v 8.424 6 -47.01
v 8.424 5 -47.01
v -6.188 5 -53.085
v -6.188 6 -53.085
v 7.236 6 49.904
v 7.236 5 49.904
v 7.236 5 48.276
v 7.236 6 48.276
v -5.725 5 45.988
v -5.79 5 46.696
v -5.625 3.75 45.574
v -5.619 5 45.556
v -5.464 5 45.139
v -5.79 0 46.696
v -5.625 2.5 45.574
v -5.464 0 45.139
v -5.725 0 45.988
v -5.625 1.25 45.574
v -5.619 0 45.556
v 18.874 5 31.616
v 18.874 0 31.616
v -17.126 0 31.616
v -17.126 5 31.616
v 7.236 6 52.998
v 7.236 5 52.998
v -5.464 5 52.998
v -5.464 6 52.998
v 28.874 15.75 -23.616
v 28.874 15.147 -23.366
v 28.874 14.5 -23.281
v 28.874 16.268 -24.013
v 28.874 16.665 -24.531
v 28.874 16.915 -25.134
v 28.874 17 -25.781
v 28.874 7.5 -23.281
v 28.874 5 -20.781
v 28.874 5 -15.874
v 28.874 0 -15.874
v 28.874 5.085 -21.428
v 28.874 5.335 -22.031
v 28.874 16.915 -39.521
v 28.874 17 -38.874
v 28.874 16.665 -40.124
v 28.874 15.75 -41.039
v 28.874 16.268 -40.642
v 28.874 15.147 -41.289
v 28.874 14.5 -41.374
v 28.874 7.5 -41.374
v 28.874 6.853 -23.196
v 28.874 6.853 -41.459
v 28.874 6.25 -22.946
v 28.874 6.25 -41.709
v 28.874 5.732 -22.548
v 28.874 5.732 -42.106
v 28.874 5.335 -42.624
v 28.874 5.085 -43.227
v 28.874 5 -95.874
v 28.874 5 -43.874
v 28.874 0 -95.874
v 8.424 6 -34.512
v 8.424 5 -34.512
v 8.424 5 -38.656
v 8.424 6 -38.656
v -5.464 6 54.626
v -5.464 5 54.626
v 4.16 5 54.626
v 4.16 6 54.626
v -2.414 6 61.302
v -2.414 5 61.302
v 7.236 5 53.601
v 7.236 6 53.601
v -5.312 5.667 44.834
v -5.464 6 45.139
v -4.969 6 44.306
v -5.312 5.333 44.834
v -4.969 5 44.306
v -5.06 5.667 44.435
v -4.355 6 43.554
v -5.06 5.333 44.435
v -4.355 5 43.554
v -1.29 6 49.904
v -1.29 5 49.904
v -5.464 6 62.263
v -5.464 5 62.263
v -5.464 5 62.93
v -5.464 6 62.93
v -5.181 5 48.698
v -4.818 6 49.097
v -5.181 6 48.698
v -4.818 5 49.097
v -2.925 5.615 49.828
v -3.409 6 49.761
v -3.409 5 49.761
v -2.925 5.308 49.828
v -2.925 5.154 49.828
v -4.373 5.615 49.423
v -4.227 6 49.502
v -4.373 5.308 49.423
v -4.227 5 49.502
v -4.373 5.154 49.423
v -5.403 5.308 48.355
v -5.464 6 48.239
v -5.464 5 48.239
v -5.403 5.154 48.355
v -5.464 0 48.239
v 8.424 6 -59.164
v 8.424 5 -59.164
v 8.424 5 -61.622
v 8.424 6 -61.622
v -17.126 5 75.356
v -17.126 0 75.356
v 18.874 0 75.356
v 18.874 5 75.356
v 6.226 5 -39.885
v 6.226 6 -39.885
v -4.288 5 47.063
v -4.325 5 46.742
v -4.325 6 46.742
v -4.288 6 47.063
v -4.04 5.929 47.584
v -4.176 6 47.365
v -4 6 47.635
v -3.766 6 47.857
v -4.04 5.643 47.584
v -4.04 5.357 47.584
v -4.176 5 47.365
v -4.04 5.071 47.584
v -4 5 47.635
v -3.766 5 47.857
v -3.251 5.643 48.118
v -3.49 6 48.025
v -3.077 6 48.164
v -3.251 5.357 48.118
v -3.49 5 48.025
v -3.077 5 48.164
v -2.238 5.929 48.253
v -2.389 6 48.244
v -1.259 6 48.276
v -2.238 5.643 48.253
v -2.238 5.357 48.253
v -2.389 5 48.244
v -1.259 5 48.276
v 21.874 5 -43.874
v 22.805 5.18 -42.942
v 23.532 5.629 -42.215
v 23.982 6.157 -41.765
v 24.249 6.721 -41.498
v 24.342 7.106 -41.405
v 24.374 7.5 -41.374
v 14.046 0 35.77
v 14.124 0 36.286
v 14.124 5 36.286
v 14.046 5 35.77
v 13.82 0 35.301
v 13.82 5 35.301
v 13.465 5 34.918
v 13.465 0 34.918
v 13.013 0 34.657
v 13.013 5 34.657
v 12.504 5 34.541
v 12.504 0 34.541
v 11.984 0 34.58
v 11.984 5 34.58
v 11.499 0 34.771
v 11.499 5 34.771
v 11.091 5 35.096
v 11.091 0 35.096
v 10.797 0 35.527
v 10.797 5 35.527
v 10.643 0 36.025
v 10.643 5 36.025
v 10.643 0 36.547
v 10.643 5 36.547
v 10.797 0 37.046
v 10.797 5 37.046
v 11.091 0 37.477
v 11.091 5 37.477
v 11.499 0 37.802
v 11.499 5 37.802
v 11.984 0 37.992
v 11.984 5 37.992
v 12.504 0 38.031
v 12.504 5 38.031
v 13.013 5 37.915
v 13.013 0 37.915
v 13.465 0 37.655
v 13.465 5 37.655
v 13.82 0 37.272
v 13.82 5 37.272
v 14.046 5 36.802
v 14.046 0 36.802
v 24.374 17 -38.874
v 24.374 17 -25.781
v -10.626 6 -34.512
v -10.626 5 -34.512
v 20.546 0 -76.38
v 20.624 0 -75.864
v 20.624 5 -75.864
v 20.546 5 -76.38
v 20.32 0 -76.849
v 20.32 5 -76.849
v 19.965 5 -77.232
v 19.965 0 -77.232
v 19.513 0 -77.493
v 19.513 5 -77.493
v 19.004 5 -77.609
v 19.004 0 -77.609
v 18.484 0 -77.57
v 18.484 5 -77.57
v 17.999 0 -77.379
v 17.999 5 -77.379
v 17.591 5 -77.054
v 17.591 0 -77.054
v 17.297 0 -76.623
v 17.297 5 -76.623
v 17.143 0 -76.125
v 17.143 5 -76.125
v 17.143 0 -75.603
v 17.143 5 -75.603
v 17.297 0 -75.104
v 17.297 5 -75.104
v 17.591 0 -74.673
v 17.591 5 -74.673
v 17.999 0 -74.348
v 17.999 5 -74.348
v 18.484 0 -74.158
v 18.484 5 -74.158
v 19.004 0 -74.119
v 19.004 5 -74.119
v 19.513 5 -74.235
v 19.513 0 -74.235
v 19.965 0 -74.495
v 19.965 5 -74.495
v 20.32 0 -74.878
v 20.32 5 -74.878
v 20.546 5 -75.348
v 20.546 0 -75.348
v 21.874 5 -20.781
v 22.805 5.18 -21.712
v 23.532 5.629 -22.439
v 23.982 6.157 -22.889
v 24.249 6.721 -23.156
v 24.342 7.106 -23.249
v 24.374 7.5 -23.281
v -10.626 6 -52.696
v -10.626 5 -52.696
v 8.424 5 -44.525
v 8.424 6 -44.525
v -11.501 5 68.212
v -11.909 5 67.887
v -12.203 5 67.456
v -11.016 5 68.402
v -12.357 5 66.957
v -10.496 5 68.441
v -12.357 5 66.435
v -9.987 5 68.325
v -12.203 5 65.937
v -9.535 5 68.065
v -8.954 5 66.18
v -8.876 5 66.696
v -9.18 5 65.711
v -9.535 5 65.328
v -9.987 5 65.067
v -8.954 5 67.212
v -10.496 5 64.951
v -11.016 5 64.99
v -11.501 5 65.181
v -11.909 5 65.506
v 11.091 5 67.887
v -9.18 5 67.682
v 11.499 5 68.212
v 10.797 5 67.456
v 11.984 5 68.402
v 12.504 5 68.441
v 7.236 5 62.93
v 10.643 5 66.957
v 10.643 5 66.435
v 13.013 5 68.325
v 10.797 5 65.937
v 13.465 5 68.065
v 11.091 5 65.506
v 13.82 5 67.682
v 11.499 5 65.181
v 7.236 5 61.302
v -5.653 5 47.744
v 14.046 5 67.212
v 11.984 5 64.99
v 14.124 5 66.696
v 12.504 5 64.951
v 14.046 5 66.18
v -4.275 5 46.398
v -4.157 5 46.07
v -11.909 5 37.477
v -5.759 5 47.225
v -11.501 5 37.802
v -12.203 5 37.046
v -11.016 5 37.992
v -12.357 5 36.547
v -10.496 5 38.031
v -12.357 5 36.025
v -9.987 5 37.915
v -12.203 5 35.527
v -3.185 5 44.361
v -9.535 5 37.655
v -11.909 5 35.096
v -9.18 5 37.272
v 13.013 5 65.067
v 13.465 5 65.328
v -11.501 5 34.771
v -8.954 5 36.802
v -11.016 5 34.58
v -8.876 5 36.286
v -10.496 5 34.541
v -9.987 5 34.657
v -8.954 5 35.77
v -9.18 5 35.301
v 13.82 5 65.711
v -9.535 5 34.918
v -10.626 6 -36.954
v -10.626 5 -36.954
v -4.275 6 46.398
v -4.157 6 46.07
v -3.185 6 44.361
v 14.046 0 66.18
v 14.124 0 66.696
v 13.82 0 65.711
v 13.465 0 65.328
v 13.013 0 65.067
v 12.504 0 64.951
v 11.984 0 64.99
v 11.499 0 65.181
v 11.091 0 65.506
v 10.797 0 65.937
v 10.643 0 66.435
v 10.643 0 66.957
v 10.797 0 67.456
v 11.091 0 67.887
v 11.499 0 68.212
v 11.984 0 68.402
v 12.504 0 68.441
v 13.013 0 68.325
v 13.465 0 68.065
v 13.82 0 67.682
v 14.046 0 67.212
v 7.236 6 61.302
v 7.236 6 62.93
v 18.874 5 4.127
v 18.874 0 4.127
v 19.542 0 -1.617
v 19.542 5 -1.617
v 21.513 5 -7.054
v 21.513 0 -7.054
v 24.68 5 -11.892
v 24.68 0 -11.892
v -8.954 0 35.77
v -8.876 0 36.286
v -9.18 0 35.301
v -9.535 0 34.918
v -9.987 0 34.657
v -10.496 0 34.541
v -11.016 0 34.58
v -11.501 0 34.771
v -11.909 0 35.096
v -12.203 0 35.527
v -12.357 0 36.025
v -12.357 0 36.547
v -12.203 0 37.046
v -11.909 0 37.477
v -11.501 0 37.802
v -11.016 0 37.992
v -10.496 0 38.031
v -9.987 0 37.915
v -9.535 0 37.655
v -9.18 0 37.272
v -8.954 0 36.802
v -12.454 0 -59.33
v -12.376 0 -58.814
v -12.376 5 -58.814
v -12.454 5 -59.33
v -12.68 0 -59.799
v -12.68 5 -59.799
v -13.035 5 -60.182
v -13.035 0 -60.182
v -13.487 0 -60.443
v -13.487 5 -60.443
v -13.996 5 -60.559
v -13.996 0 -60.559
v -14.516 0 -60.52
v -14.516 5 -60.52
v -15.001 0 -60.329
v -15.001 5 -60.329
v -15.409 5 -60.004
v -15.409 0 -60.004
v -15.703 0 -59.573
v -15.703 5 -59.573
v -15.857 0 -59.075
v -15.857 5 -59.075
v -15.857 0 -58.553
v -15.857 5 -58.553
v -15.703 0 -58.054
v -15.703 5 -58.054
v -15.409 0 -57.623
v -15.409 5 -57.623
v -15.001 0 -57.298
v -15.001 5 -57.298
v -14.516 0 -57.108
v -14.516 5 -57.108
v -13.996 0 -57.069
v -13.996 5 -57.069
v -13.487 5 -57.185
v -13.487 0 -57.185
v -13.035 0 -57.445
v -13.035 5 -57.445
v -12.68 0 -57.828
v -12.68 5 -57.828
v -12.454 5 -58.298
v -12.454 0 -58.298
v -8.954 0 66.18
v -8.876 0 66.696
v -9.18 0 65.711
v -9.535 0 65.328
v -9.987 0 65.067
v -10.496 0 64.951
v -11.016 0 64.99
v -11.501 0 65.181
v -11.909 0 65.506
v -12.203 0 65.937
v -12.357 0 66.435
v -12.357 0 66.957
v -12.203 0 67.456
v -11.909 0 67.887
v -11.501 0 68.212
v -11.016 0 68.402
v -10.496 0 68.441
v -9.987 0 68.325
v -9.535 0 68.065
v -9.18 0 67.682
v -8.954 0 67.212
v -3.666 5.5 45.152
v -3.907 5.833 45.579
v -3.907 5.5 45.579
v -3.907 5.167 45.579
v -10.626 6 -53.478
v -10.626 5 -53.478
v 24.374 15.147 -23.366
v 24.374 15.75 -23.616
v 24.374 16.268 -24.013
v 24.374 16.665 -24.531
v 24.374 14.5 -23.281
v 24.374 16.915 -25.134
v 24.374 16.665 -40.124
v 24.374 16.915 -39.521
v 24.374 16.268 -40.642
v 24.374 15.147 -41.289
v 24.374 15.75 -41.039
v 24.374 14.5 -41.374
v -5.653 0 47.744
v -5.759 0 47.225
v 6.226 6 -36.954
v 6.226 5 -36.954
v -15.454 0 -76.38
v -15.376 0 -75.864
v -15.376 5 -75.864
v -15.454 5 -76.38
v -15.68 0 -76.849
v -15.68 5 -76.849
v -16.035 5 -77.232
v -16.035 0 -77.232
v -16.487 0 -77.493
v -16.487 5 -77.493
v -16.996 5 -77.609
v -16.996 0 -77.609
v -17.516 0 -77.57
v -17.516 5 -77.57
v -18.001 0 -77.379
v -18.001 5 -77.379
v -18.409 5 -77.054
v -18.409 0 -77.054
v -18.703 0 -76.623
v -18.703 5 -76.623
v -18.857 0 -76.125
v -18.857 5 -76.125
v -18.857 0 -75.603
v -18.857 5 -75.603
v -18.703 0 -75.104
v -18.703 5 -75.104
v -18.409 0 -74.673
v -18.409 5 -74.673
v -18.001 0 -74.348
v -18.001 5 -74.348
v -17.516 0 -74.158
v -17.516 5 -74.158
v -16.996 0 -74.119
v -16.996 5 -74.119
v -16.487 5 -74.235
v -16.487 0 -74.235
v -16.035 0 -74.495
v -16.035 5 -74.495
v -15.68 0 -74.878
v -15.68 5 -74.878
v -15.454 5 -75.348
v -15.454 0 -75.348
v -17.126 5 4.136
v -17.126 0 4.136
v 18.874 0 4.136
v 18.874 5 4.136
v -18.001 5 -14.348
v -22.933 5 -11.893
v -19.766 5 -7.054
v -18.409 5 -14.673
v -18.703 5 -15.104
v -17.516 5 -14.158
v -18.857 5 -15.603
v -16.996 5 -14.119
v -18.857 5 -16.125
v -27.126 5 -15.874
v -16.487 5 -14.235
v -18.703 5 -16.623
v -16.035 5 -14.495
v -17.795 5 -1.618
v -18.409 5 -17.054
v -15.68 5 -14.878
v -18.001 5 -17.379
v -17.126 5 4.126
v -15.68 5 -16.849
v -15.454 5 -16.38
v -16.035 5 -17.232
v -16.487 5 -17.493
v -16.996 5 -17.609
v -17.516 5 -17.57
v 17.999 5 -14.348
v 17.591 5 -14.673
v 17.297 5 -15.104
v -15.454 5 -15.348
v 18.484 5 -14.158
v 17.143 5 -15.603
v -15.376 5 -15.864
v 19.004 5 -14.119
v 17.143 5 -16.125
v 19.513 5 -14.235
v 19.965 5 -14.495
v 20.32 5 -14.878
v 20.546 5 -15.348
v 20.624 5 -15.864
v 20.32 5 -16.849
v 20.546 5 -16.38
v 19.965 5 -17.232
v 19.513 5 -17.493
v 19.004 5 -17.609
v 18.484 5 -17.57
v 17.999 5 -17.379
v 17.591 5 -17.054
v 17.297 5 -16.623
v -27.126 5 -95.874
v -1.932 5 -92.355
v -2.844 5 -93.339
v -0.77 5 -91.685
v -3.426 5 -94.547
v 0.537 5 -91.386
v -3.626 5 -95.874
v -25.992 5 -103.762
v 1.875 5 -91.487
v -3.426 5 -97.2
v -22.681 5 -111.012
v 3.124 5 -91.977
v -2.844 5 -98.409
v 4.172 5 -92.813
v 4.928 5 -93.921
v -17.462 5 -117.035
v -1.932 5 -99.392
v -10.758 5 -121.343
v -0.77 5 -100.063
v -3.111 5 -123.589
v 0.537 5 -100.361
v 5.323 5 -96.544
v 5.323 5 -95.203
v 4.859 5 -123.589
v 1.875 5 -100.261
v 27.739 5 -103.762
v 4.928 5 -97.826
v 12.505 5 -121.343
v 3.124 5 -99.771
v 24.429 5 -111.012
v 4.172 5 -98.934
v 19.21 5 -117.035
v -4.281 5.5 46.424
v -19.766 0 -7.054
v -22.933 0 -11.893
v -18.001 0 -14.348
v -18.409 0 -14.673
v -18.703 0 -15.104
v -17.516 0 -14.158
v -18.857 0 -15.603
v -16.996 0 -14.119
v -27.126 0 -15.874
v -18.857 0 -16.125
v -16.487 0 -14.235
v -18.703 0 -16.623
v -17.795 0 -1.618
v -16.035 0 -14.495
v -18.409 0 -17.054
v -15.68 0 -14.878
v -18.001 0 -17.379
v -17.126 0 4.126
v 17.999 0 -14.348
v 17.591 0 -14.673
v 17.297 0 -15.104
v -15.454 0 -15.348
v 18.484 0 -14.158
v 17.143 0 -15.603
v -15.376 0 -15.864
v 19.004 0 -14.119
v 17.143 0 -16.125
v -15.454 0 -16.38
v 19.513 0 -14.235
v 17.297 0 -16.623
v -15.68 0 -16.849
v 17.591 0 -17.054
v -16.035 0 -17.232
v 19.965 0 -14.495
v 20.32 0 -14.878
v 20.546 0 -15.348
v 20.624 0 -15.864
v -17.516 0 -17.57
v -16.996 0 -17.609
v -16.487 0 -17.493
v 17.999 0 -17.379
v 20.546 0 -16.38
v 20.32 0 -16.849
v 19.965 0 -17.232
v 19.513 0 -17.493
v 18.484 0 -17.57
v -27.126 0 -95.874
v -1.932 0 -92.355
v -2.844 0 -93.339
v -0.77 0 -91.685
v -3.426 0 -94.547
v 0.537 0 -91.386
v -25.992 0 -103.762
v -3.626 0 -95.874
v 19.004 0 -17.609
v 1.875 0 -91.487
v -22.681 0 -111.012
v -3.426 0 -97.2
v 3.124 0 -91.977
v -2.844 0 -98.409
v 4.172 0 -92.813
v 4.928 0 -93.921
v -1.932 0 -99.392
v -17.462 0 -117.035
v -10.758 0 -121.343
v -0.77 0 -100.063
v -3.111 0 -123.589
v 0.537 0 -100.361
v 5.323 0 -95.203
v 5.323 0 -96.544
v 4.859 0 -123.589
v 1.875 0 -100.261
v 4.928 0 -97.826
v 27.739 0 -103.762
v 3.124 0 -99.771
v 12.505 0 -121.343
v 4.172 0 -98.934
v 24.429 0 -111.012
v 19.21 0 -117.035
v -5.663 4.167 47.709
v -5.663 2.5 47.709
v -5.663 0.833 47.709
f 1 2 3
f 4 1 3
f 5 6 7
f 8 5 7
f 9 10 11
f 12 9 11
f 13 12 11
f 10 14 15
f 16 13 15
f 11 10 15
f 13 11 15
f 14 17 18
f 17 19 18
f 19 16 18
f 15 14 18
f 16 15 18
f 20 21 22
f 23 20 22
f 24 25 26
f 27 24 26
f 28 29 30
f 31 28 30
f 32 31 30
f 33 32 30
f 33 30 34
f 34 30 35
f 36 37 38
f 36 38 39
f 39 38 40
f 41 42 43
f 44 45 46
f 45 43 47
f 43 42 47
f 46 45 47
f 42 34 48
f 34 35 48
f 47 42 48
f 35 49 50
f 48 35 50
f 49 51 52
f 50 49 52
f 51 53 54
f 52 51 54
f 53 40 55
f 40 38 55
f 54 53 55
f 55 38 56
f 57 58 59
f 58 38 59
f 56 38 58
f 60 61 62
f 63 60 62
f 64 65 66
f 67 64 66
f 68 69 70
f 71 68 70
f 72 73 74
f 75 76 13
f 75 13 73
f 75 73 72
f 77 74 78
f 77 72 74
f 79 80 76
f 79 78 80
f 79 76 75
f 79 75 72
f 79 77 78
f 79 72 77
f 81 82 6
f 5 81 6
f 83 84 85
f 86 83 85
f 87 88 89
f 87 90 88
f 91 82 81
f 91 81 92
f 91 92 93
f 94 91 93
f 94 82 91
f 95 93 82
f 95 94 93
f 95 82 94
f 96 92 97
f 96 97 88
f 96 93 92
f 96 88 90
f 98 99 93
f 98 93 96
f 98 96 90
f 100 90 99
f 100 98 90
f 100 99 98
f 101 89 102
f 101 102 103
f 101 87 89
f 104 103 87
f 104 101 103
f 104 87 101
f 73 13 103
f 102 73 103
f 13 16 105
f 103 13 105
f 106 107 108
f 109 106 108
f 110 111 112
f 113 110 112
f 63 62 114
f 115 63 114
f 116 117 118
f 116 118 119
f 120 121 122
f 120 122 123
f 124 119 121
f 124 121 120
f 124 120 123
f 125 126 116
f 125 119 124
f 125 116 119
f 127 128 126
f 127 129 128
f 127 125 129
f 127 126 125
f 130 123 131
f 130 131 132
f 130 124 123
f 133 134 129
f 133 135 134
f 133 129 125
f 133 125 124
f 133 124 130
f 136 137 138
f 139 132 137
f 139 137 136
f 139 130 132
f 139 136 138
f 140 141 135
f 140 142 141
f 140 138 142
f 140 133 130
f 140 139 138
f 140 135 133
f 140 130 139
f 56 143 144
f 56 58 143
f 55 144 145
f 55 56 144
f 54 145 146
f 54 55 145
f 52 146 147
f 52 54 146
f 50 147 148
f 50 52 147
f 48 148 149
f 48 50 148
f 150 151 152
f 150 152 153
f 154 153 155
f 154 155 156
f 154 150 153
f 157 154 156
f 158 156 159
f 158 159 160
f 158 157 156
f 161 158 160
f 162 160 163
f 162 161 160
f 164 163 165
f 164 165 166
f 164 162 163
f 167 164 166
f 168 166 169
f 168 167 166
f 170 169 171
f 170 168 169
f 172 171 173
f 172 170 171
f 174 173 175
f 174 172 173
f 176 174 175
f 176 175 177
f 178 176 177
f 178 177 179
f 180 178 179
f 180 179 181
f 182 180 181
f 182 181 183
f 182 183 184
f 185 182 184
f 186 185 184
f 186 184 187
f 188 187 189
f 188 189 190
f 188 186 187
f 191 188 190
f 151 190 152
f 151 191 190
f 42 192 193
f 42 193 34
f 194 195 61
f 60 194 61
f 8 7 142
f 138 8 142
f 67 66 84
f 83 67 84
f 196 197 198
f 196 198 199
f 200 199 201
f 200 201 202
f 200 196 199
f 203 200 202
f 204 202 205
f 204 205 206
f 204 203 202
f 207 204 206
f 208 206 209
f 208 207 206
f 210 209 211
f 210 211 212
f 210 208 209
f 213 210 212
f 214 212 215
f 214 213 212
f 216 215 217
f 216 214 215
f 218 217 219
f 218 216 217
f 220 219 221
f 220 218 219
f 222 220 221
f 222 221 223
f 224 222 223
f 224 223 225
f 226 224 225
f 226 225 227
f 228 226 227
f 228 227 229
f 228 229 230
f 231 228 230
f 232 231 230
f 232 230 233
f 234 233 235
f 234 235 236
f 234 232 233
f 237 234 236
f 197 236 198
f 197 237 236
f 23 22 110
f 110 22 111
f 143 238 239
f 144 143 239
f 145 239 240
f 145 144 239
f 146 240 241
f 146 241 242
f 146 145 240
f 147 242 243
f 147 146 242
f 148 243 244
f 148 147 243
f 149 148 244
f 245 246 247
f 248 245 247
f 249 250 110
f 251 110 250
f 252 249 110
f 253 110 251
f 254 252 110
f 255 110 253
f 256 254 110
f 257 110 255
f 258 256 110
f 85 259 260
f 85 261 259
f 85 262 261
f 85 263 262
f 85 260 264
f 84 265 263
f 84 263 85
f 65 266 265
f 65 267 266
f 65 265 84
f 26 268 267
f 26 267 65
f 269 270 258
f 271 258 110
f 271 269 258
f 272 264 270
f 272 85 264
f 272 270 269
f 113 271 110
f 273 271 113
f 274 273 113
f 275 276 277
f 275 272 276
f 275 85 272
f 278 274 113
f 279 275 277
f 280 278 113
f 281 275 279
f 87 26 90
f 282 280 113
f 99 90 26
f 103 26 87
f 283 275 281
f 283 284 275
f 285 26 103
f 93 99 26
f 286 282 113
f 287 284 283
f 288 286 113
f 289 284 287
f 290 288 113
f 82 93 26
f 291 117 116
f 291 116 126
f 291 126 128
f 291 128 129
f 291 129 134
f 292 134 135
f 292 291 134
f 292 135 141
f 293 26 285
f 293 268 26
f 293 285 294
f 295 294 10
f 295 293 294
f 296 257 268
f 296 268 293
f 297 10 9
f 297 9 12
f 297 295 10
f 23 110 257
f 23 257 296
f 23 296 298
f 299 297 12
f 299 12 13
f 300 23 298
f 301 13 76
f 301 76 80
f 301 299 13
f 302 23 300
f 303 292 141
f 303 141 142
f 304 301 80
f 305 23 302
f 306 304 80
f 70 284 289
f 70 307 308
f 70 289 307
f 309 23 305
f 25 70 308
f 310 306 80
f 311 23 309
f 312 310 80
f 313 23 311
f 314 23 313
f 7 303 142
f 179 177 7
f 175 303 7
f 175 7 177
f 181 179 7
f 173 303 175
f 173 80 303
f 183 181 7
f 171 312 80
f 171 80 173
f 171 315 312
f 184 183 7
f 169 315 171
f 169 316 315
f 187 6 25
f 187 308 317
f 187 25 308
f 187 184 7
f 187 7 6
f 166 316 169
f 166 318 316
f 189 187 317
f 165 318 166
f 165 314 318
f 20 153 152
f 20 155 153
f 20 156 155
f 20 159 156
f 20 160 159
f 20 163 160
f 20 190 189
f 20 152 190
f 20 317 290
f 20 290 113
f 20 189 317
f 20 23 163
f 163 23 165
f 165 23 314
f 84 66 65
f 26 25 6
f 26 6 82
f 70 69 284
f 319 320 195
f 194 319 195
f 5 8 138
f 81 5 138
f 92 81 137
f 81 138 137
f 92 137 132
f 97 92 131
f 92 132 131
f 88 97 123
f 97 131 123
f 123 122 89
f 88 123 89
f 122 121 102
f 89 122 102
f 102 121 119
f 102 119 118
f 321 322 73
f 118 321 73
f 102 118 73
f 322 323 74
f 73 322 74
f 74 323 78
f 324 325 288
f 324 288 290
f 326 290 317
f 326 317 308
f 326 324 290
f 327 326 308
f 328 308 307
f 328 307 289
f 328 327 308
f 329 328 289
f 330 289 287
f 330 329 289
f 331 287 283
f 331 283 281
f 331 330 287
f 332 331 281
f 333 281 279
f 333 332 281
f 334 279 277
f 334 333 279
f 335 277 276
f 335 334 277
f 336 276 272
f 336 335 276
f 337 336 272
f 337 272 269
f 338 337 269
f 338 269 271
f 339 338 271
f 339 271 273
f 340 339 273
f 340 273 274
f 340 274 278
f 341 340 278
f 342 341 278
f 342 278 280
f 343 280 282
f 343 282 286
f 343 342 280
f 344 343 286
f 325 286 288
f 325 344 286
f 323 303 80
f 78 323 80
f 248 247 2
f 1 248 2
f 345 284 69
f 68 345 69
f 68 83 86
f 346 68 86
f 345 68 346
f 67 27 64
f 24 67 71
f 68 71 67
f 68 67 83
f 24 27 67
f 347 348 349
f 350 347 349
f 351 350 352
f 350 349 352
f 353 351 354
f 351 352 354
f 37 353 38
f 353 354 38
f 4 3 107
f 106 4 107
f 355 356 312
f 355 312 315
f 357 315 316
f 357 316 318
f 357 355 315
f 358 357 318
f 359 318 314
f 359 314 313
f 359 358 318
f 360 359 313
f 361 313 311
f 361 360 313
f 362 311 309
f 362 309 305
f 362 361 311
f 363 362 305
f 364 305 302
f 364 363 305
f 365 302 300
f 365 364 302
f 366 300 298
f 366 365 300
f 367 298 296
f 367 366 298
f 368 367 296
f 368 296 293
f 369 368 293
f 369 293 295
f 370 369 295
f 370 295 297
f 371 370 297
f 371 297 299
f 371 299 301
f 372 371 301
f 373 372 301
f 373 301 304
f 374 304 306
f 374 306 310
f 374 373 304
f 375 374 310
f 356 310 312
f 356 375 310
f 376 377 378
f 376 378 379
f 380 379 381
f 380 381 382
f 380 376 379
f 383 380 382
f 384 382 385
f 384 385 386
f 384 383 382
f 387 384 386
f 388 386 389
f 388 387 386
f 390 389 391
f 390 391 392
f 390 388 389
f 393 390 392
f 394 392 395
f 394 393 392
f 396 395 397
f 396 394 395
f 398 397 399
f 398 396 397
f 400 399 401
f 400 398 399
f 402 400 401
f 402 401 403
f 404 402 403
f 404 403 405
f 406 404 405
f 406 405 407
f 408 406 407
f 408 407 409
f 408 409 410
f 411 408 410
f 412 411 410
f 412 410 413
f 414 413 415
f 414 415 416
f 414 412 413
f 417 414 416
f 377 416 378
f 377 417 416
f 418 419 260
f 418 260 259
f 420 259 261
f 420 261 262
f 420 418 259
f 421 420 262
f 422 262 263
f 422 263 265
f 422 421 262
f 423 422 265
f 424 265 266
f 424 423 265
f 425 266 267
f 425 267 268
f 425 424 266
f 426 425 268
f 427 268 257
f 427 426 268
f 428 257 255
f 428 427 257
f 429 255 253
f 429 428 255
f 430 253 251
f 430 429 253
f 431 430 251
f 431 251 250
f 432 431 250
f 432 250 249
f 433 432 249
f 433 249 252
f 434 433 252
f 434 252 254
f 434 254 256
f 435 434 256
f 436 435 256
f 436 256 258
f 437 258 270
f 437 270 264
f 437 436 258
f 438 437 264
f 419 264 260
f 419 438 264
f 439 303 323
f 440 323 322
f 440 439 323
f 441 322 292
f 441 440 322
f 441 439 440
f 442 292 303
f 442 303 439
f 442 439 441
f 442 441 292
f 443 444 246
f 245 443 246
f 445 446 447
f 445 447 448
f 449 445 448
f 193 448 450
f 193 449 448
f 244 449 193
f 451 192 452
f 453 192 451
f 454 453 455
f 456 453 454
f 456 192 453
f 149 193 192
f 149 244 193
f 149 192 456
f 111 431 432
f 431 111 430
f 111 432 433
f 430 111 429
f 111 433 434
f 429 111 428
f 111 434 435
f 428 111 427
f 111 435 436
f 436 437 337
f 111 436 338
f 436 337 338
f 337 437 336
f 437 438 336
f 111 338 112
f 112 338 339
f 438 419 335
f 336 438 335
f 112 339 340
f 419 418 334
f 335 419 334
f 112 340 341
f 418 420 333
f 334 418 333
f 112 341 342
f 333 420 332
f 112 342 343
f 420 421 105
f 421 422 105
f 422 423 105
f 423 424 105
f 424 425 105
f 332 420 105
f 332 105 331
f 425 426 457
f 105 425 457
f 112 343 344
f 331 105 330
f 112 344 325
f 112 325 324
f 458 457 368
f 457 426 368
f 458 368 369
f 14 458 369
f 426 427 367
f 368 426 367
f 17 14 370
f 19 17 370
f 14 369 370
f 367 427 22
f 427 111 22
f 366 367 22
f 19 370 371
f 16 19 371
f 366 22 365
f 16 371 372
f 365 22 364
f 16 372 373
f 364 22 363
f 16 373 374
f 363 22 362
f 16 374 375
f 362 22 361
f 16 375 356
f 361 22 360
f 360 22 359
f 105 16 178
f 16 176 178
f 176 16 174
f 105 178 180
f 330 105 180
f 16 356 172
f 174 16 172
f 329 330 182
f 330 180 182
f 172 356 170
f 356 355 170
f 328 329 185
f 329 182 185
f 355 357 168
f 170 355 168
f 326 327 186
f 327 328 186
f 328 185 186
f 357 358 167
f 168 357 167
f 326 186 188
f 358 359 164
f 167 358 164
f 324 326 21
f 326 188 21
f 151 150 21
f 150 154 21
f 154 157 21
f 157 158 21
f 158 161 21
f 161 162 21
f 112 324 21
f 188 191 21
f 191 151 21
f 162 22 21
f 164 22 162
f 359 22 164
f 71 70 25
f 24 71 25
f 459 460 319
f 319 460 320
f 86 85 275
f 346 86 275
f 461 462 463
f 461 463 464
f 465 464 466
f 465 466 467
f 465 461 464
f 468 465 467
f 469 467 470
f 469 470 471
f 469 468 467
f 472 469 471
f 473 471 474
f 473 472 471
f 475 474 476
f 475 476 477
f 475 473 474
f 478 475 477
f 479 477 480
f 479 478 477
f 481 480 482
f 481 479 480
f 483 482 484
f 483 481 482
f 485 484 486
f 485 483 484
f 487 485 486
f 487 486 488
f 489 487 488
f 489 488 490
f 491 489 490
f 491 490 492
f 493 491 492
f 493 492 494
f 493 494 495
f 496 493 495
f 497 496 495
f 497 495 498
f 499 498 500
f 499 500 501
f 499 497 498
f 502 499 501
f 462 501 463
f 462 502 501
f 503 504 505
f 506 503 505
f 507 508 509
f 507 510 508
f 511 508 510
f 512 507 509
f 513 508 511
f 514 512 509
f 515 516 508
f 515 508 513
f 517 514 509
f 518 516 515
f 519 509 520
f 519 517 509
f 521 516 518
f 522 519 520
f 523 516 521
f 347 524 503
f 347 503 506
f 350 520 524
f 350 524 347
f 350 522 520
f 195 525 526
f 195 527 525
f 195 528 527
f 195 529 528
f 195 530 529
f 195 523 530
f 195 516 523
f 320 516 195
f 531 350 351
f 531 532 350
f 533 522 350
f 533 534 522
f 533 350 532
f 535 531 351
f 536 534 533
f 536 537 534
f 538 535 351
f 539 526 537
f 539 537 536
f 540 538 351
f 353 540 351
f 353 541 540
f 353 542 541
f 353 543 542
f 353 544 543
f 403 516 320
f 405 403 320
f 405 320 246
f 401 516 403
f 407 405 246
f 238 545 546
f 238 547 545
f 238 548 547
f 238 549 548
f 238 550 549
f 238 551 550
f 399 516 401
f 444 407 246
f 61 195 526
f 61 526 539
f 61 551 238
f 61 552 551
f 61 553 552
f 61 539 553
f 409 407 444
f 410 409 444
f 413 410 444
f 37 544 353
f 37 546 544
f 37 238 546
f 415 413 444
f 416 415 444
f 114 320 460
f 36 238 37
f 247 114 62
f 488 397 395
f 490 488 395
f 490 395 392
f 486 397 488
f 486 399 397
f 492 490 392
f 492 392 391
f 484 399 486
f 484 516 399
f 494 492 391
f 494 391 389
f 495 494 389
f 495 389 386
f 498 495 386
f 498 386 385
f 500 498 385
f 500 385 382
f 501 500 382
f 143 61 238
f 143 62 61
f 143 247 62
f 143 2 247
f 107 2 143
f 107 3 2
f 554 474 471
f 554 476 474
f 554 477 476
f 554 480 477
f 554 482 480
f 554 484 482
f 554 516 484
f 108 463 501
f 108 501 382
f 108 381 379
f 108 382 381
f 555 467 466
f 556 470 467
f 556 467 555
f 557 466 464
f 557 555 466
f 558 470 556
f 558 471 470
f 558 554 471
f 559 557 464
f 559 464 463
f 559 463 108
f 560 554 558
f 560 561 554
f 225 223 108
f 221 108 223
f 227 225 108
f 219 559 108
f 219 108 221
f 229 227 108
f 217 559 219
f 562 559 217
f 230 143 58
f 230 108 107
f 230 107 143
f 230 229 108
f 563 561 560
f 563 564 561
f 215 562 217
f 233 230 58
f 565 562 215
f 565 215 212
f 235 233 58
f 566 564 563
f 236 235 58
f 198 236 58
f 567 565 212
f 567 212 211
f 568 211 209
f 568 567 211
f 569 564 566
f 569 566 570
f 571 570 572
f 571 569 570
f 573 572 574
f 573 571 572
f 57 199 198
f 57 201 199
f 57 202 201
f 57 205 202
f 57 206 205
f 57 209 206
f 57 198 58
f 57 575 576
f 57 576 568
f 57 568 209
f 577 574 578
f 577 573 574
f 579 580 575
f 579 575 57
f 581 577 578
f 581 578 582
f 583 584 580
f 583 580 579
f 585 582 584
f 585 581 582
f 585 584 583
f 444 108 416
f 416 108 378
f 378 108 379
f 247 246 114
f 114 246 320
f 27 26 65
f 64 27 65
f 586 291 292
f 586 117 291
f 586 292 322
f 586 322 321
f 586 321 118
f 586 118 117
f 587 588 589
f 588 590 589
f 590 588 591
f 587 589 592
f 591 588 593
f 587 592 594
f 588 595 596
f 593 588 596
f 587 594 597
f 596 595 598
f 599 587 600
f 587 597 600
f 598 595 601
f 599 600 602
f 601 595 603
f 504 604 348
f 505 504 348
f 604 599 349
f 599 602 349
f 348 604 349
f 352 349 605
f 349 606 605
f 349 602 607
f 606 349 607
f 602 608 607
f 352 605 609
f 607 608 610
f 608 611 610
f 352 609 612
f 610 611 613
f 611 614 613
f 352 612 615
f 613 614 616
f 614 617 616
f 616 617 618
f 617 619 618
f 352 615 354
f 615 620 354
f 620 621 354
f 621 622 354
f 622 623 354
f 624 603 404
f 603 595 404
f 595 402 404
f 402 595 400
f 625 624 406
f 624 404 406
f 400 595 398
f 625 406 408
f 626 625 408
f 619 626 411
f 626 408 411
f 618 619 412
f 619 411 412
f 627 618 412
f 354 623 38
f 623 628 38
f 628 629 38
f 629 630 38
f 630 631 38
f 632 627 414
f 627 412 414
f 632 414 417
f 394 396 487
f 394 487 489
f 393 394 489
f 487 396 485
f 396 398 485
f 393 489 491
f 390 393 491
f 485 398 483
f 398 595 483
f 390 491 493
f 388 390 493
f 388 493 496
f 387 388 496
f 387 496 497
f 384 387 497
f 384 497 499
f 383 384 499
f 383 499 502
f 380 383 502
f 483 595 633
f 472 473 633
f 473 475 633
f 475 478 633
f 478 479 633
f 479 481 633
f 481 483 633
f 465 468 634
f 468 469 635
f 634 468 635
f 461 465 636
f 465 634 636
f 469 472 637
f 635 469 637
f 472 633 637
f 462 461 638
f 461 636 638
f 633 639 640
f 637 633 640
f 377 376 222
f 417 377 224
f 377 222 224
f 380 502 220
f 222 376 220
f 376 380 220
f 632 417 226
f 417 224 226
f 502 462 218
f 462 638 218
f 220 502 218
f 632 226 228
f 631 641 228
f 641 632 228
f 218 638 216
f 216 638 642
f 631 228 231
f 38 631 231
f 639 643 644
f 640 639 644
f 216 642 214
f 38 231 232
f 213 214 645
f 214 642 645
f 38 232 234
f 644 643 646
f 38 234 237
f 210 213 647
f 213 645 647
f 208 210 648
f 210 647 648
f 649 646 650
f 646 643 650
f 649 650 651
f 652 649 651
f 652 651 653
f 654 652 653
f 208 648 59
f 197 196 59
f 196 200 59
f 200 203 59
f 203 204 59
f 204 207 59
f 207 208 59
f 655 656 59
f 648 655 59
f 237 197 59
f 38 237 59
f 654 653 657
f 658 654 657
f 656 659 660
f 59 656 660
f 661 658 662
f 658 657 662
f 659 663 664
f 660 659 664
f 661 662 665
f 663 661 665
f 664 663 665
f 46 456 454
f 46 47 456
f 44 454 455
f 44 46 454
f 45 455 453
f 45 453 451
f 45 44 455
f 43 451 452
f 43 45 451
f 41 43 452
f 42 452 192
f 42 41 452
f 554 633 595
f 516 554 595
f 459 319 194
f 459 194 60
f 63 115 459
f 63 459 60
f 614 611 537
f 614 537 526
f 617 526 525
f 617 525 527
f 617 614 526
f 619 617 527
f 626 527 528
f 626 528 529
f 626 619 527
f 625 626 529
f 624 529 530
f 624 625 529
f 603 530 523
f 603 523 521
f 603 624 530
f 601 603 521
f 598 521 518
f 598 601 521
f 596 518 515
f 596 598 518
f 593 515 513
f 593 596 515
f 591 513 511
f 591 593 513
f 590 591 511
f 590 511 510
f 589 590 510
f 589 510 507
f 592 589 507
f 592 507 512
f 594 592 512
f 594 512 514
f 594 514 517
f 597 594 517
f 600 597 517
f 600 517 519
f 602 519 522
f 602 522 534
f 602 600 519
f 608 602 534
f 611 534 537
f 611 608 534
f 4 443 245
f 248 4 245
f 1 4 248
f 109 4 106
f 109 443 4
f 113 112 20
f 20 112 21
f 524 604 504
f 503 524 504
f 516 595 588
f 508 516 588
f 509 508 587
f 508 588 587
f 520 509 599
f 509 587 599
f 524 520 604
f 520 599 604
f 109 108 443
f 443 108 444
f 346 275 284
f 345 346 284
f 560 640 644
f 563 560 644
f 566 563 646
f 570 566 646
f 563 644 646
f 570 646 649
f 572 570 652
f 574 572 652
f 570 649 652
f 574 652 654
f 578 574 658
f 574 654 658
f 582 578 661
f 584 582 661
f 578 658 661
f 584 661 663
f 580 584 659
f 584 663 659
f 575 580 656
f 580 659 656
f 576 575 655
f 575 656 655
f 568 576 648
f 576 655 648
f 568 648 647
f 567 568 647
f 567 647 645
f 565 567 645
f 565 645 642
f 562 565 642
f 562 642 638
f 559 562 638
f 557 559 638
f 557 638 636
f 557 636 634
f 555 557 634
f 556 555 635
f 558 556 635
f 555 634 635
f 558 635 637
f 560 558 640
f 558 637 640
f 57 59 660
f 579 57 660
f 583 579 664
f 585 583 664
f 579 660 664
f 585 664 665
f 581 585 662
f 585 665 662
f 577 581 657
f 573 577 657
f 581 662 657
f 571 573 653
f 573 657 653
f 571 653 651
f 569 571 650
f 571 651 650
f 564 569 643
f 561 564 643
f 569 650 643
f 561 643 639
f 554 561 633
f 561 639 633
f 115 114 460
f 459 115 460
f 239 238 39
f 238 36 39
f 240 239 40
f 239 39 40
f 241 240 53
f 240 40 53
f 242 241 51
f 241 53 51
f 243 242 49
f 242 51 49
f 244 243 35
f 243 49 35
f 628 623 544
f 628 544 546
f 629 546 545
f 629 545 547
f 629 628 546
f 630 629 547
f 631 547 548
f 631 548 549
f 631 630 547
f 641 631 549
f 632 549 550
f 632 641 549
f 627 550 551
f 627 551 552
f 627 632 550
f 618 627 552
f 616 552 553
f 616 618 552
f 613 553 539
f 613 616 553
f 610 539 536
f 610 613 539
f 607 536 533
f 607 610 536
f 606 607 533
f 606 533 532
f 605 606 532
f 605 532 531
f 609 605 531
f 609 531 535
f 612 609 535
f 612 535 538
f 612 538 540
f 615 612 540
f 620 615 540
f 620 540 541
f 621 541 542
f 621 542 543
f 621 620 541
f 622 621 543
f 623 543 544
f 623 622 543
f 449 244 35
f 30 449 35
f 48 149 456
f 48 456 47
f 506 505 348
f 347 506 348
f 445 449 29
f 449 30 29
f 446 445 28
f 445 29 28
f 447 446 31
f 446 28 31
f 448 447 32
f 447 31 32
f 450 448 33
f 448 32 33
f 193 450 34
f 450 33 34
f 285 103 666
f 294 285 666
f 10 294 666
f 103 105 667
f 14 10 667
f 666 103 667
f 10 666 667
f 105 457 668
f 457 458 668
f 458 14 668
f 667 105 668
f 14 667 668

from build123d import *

# Parameters (mm, degrees)
SKETCH2_R           = 1.75
BOSS_EXTRUDE5_DEPTH = 5
BOSS_EXTRUDE6_DEPTH = 6
SKETCH3_W           = 4.5
SKETCH3_H           = 18.093056915
BOSS_EXTRUDE7_DEPTH = 12
FILLET1_R           = 2.5


with BuildPart() as part:
    # Sketch2 → Boss-Extrude5 (new body)
    with BuildSketch(Plane(origin=(0, 0, 0), x_dir=(1, 0, 0), z_dir=(0, 1, 0))):
        with BuildLine():
            Line((-17.126311361, -31.616311361), (-17.126311361, -75.356311361))
            Line((-17.126311361, -75.356311361), (-5.464372379, -75.356311361))
            Line((-5.464372379, -75.356311361), (-5.464372379, -62.929901105))
            Line((-5.464372379, -62.929901105), (-5.464372379, -62.26335463))
            Line((-5.464372379, -62.26335463), (-5.464372379, -54.626054951))
            Line((-5.464372379, -54.626054951), (-5.464372379, -52.997849822))
            Line((-5.464372379, -52.997849822), (-5.464372379, -48.239212878))
            add(Edge.make_bspline(
                [(-5.464372379, -48.239212878), (-5.479308008, -48.209347326), (-5.526944327, -48.109888501), (-5.598562611, -47.934535736), (-5.665278067, -47.707111583), (-5.722418695, -47.469664507), (-5.777392685, -47.132561506), (-5.789435468, -46.872012813), (-5.790013405, -46.696187162)],
                knots=[0.75048722, 0.75048722, 0.75048722, 0.75048722, 0.766195838, 0.802355905, 0.839467772, 0.877601694, 0.917224315, 1, 1, 1, 1], degree=3))
            add(Edge.make_bspline(
                [(-5.790013405, -46.696187162), (-5.791830358, -46.443369479), (-5.752256309, -46.064323872), (-5.630108747, -45.570490958), (-5.535850567, -45.305024528), (-5.474802855, -45.162981053), (-5.464372379, -45.139410724)],
                knots=[0, 0, 0, 0, 0.213832278, 0.321108442, 0.430122341, 0.45193341, 0.45193341, 0.45193341, 0.45193341], degree=3))
            Line((-5.464372379, -45.139410724), (-5.464372379, -31.616311361))
            Line((-5.464372379, -31.616311361), (-17.126311361, -31.616311361))
        make_face()
        with Locations((-10.626311361, -66.696311361)):
            Circle(SKETCH2_R, mode=Mode.SUBTRACT)
        with Locations((-10.626311361, -36.286311361)):
            Circle(SKETCH2_R, mode=Mode.SUBTRACT)
        with BuildLine():
            Line((-5.464372379, -62.929901105), (-5.464372379, -75.356311361))
            Line((-5.464372379, -75.356311361), (18.873688639, -75.356311361))
            Line((18.873688639, -75.356311361), (18.873688639, -31.616311361))
            Line((18.873688639, -31.616311361), (-5.464372379, -31.616311361))
            Line((-5.464372379, -31.616311361), (-5.464372379, -45.139410724))
            add(Edge.make_bspline(
                [(-5.464372379, -45.139410724), (-5.41828807, -45.035271445), (-5.296718229, -44.792277229), (-4.945206965, -44.247543692), (-4.608474951, -43.832316799), (-4.355157635, -43.554260079)],
                knots=[0.45193341, 0.45193341, 0.45193341, 0.45193341, 0.548299864, 0.681572511, 1, 1, 1, 1], degree=3))
            Line((-4.355157635, -43.554260079), (-3.184885199, -44.360730431))
            add(Edge.make_bspline(
                [(-3.184885199, -44.360730431), (-3.299202447, -44.541589378), (-3.459903064, -44.805093082), (-3.661450848, -45.143322346), (-3.790371764, -45.367230916), (-3.902981676, -45.571332012), (-4.029665545, -45.800928622), (-4.10835225, -45.966968377), (-4.156720135, -46.070345816)],
                knots=[0, 0, 0, 0, 0.32618873, 0.470537175, 0.600272768, 0.720074035, 0.825942194, 1, 1, 1, 1], degree=3))
            add(Edge.make_bspline(
                [(-4.156720135, -46.070345816), (-4.209286382, -46.184077533), (-4.286247323, -46.404049964), (-4.325967125, -46.634236156), (-4.324628789, -46.741980431)],
                knots=[0, 0, 0, 0, 0.538548713, 1, 1, 1, 1], degree=3))
            add(Edge.make_bspline(
                [(-4.324628789, -46.741980431), (-4.324559221, -46.891783443), (-4.290667843, -47.117141621), (-4.167635974, -47.393772358), (-4.044150741, -47.588920682), (-3.887300055, -47.764285737), (-3.698888458, -47.910877403), (-3.487752607, -48.034615376), (-3.286355624, -48.109906835), (-3.101832091, -48.161844908), (-2.929102182, -48.188504454), (-2.72685785, -48.218954398), (-2.492989027, -48.236143316), (-2.228537136, -48.255203457), (-1.813788183, -48.271918849), (-1.487184361, -48.276087959), (-1.259023821, -48.276054951)],
                knots=[0, 0, 0, 0, 0.116093762, 0.173422383, 0.233342697, 0.29424406, 0.354533692, 0.417481441, 0.482953194, 0.520380905, 0.565714452, 0.618080332, 0.678708602, 0.747141738, 0.823369406, 1, 1, 1, 1], degree=3))
            Line((-1.259023821, -48.276054951), (7.235627621, -48.276054951))
            Line((7.235627621, -48.276054951), (7.235627621, -49.904260079))
            Line((7.235627621, -49.904260079), (-1.289552667, -49.904260079))
            add(Edge.make_bspline(
                [(-1.289552667, -49.904260079), (-1.586310839, -49.901182176), (-2.014411, -49.900143194), (-2.559462693, -49.863595429), (-2.915754705, -49.830541303), (-3.236953259, -49.791791145), (-3.523261343, -49.741237263), (-3.773600929, -49.681488083), (-4.058575491, -49.587069258), (-4.376573461, -49.433687342), (-4.72160044, -49.195875985), (-5.02821201, -48.899206761), (-5.251787885, -48.611218592), (-5.389284918, -48.383433866), (-5.444864563, -48.278221057), (-5.464372379, -48.239212878)],
                knots=[0, 0, 0, 0, 0.139694311, 0.201274236, 0.256981351, 0.308058655, 0.353456894, 0.393717345, 0.429048902, 0.494549285, 0.559079856, 0.625401593, 0.694521248, 0.729969783, 0.75048722, 0.75048722, 0.75048722, 0.75048722], degree=3))
            Line((-5.464372379, -48.239212878), (-5.464372379, -52.997849822))
            Line((-5.464372379, -52.997849822), (7.235627621, -52.997849822))
            Line((7.235627621, -52.997849822), (7.235627621, -53.600794534))
            Line((7.235627621, -53.600794534), (-2.414031834, -61.301695976))
            Line((-2.414031834, -61.301695976), (7.235627621, -61.301695976))
            Line((7.235627621, -61.301695976), (7.235627621, -62.929901105))
            Line((7.235627621, -62.929901105), (-5.464372379, -62.929901105))
        make_face()
        with Locations((12.373688639, -66.696311361)):
            Circle(SKETCH2_R, mode=Mode.SUBTRACT)
        with Locations((12.373688639, -36.286311361)):
            Circle(SKETCH2_R, mode=Mode.SUBTRACT)
        with BuildLine():
            Line((-17.126311361, -4.126311361), (-17.126311361, -4.136311361))
            Line((-17.126311361, -4.136311361), (-10.626311361, -4.136311361))
            Line((-10.626311361, -4.136311361), (-10.626311361, 34.51195787))
            Line((-10.626311361, 34.51195787), (-10.626311361, 36.954265562))
            Line((-10.626311361, 36.954265562), (-10.626311361, 52.69570186))
            Line((-10.626311361, 52.69570186), (-10.626311361, 53.478003543))
            Line((-10.626311361, 53.478003543), (-10.626311361, 95.873688639))
            Line((-10.626311361, 95.873688639), (-27.126311361, 95.873688639))
            Line((-27.126311361, 95.873688639), (-27.126311361, 15.874142351))
            ThreePointArc((-27.126311361, 15.874142351), (-19.765625932, 7.054231433), (-17.126311361, -4.126311361))
        make_face()
        with Locations((-17.126311361, 15.863688639)):
            Circle(SKETCH2_R, mode=Mode.SUBTRACT)
        with Locations((-14.126311361, 58.813688639)):
            Circle(SKETCH2_R, mode=Mode.SUBTRACT)
        with Locations((-17.126311361, 75.863688639)):
            Circle(SKETCH2_R, mode=Mode.SUBTRACT)
        with BuildLine():
            Line((-10.626311361, 34.51195787), (-10.626311361, -4.136311361))
            Line((-10.626311361, -4.136311361), (18.873688639, -4.136311361))
            Line((18.873688639, -4.136311361), (18.873688639, -4.126765073))
            ThreePointArc((18.873688639, -4.126765073), (21.51300321, 7.053777721), (28.873688639, 15.873688639))
            Line((28.873688639, 15.873688639), (28.873688639, 95.873688639))
            Line((28.873688639, 95.873688639), (5.373688639, 95.873688639))
            ThreePointArc((5.373688639, 95.873688639), (0.873688639, 91.373688639), (-3.626311361, 95.873688639))
            Line((-3.626311361, 95.873688639), (-10.626311361, 95.873688639))
            Line((-10.626311361, 95.873688639), (-10.626311361, 53.478003543))
            Line((-10.626311361, 53.478003543), (8.423688639, 61.621573254))
            Line((8.423688639, 61.621573254), (8.423688639, 59.164001139))
            Line((8.423688639, 59.164001139), (-6.188180351, 53.084944649))
            Line((-6.188180351, 53.084944649), (8.423688639, 47.009704264))
            Line((8.423688639, 47.009704264), (8.423688639, 44.525419408))
            Line((8.423688639, 44.525419408), (-10.626311361, 52.69570186))
            Line((-10.626311361, 52.69570186), (-10.626311361, 36.954265562))
            Line((-10.626311361, 36.954265562), (6.225611716, 36.954265562))
            Line((6.225611716, 36.954265562), (6.225611716, 39.885034793))
            Line((6.225611716, 39.885034793), (8.423688639, 38.656248735))
            Line((8.423688639, 38.656248735), (8.423688639, 34.51195787))
            Line((8.423688639, 34.51195787), (-10.626311361, 34.51195787))
        make_face()
        with Locations((18.873688639, 15.863688639)):
            Circle(SKETCH2_R, mode=Mode.SUBTRACT)
        with Locations((18.873688639, 75.863688639)):
            Circle(SKETCH2_R, mode=Mode.SUBTRACT)
        Polygon((-5.464372379, -54.626054951), (-5.464372379, -62.26335463), (4.159846371, -54.626054951), align=None)
        with BuildLine():
            ThreePointArc((28.873688639, 95.873688639), (0.873688639, 123.873688639), (-27.126311361, 95.873688639))
            Line((-27.126311361, 95.873688639), (-10.626311361, 95.873688639))
            Line((-10.626311361, 95.873688639), (-3.626311361, 95.873688639))
            ThreePointArc((-3.626311361, 95.873688639), (0.873688639, 100.373688639), (5.373688639, 95.873688639))
            Line((5.373688639, 95.873688639), (28.873688639, 95.873688639))
        make_face()
    extrude(amount=BOSS_EXTRUDE5_DEPTH)

    # Sketch2<10> → Boss-Extrude6 (add)
    with BuildSketch(Plane(origin=(0, 0, 0), x_dir=(1, 0, 0), z_dir=(0, 1, 0))):
        Polygon((-5.464372379, -62.26335463), (-5.464372379, -62.929901105), (7.235627621, -62.929901105), (7.235627621, -61.301695976), (-2.414031834, -61.301695976), (7.235627621, -53.600794534), (7.235627621, -52.997849822), (-5.464372379, -52.997849822), (-5.464372379, -54.626054951), (4.159846371, -54.626054951), align=None)
        with BuildLine():
            add(Edge.make_bspline(
                [(-5.464372379, -45.139410724), (-5.41828807, -45.035271445), (-5.296718229, -44.792277229), (-4.945206965, -44.247543692), (-4.608474951, -43.832316799), (-4.355157635, -43.554260079)],
                knots=[0.45193341, 0.45193341, 0.45193341, 0.45193341, 0.548299864, 0.681572511, 1, 1, 1, 1], degree=3))
            Line((-5.464372379, -45.139410724), (-5.464372379, -48.239212878))
            add(Edge.make_bspline(
                [(-1.289552667, -49.904260079), (-1.586310839, -49.901182176), (-2.014411, -49.900143194), (-2.559462693, -49.863595429), (-2.915754705, -49.830541303), (-3.236953259, -49.791791145), (-3.523261343, -49.741237263), (-3.773600929, -49.681488083), (-4.058575491, -49.587069258), (-4.376573461, -49.433687342), (-4.72160044, -49.195875985), (-5.02821201, -48.899206761), (-5.251787885, -48.611218592), (-5.389284918, -48.383433866), (-5.444864563, -48.278221057), (-5.464372379, -48.239212878)],
                knots=[0, 0, 0, 0, 0.139694311, 0.201274236, 0.256981351, 0.308058655, 0.353456894, 0.393717345, 0.429048902, 0.494549285, 0.559079856, 0.625401593, 0.694521248, 0.729969783, 0.75048722, 0.75048722, 0.75048722, 0.75048722], degree=3))
            Line((-1.289552667, -49.904260079), (7.235627621, -49.904260079))
            Line((7.235627621, -49.904260079), (7.235627621, -48.276054951))
            Line((7.235627621, -48.276054951), (-1.259023821, -48.276054951))
            add(Edge.make_bspline(
                [(-4.324628789, -46.741980431), (-4.324559221, -46.891783443), (-4.290667843, -47.117141621), (-4.167635974, -47.393772358), (-4.044150741, -47.588920682), (-3.887300055, -47.764285737), (-3.698888458, -47.910877403), (-3.487752607, -48.034615376), (-3.286355624, -48.109906835), (-3.101832091, -48.161844908), (-2.929102182, -48.188504454), (-2.72685785, -48.218954398), (-2.492989027, -48.236143316), (-2.228537136, -48.255203457), (-1.813788183, -48.271918849), (-1.487184361, -48.276087959), (-1.259023821, -48.276054951)],
                knots=[0, 0, 0, 0, 0.116093762, 0.173422383, 0.233342697, 0.29424406, 0.354533692, 0.417481441, 0.482953194, 0.520380905, 0.565714452, 0.618080332, 0.678708602, 0.747141738, 0.823369406, 1, 1, 1, 1], degree=3))
            add(Edge.make_bspline(
                [(-4.156720135, -46.070345816), (-4.209286382, -46.184077533), (-4.286247323, -46.404049964), (-4.325967125, -46.634236156), (-4.324628789, -46.741980431)],
                knots=[0, 0, 0, 0, 0.538548713, 1, 1, 1, 1], degree=3))
            add(Edge.make_bspline(
                [(-3.184885199, -44.360730431), (-3.299202447, -44.541589378), (-3.459903064, -44.805093082), (-3.661450848, -45.143322346), (-3.790371764, -45.367230916), (-3.902981676, -45.571332012), (-4.029665545, -45.800928622), (-4.10835225, -45.966968377), (-4.156720135, -46.070345816)],
                knots=[0, 0, 0, 0, 0.32618873, 0.470537175, 0.600272768, 0.720074035, 0.825942194, 1, 1, 1, 1], degree=3))
            Line((-3.184885199, -44.360730431), (-4.355157635, -43.554260079))
        make_face()
        Polygon((-10.626311361, 36.954265562), (-10.626311361, 34.51195787), (8.423688639, 34.51195787), (8.423688639, 38.656248735), (6.225611716, 39.885034793), (6.225611716, 36.954265562), align=None)
        Polygon((-10.626311361, 53.478003543), (-10.626311361, 52.69570186), (8.423688639, 44.525419408), (8.423688639, 47.009704264), (-6.188180351, 53.084944649), (8.423688639, 59.164001139), (8.423688639, 61.621573254), align=None)
    extrude(amount=BOSS_EXTRUDE6_DEPTH)

    # Sketch3 → Boss-Extrude7 (add)
    with BuildSketch(Plane(origin=(0, 5, 0), x_dir=(1, 0, 0), z_dir=(0, 1, 0))):
        with Locations((26.623688639, 32.327214021)):
            Rectangle(SKETCH3_W, SKETCH3_H)
    extrude(amount=BOSS_EXTRUDE7_DEPTH)

    # Fillet1
    fillet1_edges = [part.edges().sort_by_distance(p)[0] for p in [
        (26.623688639, 5, -41.373742478),
        (24.373688639, 5, -32.32721402),
        (26.623688639, 5, -23.280685563),
        (26.623688639, 17, -41.373742478),
        (26.623688639, 17, -23.280685563),
    ]]
    fillet(fillet1_edges, radius=FILLET1_R)


solid = part.part
